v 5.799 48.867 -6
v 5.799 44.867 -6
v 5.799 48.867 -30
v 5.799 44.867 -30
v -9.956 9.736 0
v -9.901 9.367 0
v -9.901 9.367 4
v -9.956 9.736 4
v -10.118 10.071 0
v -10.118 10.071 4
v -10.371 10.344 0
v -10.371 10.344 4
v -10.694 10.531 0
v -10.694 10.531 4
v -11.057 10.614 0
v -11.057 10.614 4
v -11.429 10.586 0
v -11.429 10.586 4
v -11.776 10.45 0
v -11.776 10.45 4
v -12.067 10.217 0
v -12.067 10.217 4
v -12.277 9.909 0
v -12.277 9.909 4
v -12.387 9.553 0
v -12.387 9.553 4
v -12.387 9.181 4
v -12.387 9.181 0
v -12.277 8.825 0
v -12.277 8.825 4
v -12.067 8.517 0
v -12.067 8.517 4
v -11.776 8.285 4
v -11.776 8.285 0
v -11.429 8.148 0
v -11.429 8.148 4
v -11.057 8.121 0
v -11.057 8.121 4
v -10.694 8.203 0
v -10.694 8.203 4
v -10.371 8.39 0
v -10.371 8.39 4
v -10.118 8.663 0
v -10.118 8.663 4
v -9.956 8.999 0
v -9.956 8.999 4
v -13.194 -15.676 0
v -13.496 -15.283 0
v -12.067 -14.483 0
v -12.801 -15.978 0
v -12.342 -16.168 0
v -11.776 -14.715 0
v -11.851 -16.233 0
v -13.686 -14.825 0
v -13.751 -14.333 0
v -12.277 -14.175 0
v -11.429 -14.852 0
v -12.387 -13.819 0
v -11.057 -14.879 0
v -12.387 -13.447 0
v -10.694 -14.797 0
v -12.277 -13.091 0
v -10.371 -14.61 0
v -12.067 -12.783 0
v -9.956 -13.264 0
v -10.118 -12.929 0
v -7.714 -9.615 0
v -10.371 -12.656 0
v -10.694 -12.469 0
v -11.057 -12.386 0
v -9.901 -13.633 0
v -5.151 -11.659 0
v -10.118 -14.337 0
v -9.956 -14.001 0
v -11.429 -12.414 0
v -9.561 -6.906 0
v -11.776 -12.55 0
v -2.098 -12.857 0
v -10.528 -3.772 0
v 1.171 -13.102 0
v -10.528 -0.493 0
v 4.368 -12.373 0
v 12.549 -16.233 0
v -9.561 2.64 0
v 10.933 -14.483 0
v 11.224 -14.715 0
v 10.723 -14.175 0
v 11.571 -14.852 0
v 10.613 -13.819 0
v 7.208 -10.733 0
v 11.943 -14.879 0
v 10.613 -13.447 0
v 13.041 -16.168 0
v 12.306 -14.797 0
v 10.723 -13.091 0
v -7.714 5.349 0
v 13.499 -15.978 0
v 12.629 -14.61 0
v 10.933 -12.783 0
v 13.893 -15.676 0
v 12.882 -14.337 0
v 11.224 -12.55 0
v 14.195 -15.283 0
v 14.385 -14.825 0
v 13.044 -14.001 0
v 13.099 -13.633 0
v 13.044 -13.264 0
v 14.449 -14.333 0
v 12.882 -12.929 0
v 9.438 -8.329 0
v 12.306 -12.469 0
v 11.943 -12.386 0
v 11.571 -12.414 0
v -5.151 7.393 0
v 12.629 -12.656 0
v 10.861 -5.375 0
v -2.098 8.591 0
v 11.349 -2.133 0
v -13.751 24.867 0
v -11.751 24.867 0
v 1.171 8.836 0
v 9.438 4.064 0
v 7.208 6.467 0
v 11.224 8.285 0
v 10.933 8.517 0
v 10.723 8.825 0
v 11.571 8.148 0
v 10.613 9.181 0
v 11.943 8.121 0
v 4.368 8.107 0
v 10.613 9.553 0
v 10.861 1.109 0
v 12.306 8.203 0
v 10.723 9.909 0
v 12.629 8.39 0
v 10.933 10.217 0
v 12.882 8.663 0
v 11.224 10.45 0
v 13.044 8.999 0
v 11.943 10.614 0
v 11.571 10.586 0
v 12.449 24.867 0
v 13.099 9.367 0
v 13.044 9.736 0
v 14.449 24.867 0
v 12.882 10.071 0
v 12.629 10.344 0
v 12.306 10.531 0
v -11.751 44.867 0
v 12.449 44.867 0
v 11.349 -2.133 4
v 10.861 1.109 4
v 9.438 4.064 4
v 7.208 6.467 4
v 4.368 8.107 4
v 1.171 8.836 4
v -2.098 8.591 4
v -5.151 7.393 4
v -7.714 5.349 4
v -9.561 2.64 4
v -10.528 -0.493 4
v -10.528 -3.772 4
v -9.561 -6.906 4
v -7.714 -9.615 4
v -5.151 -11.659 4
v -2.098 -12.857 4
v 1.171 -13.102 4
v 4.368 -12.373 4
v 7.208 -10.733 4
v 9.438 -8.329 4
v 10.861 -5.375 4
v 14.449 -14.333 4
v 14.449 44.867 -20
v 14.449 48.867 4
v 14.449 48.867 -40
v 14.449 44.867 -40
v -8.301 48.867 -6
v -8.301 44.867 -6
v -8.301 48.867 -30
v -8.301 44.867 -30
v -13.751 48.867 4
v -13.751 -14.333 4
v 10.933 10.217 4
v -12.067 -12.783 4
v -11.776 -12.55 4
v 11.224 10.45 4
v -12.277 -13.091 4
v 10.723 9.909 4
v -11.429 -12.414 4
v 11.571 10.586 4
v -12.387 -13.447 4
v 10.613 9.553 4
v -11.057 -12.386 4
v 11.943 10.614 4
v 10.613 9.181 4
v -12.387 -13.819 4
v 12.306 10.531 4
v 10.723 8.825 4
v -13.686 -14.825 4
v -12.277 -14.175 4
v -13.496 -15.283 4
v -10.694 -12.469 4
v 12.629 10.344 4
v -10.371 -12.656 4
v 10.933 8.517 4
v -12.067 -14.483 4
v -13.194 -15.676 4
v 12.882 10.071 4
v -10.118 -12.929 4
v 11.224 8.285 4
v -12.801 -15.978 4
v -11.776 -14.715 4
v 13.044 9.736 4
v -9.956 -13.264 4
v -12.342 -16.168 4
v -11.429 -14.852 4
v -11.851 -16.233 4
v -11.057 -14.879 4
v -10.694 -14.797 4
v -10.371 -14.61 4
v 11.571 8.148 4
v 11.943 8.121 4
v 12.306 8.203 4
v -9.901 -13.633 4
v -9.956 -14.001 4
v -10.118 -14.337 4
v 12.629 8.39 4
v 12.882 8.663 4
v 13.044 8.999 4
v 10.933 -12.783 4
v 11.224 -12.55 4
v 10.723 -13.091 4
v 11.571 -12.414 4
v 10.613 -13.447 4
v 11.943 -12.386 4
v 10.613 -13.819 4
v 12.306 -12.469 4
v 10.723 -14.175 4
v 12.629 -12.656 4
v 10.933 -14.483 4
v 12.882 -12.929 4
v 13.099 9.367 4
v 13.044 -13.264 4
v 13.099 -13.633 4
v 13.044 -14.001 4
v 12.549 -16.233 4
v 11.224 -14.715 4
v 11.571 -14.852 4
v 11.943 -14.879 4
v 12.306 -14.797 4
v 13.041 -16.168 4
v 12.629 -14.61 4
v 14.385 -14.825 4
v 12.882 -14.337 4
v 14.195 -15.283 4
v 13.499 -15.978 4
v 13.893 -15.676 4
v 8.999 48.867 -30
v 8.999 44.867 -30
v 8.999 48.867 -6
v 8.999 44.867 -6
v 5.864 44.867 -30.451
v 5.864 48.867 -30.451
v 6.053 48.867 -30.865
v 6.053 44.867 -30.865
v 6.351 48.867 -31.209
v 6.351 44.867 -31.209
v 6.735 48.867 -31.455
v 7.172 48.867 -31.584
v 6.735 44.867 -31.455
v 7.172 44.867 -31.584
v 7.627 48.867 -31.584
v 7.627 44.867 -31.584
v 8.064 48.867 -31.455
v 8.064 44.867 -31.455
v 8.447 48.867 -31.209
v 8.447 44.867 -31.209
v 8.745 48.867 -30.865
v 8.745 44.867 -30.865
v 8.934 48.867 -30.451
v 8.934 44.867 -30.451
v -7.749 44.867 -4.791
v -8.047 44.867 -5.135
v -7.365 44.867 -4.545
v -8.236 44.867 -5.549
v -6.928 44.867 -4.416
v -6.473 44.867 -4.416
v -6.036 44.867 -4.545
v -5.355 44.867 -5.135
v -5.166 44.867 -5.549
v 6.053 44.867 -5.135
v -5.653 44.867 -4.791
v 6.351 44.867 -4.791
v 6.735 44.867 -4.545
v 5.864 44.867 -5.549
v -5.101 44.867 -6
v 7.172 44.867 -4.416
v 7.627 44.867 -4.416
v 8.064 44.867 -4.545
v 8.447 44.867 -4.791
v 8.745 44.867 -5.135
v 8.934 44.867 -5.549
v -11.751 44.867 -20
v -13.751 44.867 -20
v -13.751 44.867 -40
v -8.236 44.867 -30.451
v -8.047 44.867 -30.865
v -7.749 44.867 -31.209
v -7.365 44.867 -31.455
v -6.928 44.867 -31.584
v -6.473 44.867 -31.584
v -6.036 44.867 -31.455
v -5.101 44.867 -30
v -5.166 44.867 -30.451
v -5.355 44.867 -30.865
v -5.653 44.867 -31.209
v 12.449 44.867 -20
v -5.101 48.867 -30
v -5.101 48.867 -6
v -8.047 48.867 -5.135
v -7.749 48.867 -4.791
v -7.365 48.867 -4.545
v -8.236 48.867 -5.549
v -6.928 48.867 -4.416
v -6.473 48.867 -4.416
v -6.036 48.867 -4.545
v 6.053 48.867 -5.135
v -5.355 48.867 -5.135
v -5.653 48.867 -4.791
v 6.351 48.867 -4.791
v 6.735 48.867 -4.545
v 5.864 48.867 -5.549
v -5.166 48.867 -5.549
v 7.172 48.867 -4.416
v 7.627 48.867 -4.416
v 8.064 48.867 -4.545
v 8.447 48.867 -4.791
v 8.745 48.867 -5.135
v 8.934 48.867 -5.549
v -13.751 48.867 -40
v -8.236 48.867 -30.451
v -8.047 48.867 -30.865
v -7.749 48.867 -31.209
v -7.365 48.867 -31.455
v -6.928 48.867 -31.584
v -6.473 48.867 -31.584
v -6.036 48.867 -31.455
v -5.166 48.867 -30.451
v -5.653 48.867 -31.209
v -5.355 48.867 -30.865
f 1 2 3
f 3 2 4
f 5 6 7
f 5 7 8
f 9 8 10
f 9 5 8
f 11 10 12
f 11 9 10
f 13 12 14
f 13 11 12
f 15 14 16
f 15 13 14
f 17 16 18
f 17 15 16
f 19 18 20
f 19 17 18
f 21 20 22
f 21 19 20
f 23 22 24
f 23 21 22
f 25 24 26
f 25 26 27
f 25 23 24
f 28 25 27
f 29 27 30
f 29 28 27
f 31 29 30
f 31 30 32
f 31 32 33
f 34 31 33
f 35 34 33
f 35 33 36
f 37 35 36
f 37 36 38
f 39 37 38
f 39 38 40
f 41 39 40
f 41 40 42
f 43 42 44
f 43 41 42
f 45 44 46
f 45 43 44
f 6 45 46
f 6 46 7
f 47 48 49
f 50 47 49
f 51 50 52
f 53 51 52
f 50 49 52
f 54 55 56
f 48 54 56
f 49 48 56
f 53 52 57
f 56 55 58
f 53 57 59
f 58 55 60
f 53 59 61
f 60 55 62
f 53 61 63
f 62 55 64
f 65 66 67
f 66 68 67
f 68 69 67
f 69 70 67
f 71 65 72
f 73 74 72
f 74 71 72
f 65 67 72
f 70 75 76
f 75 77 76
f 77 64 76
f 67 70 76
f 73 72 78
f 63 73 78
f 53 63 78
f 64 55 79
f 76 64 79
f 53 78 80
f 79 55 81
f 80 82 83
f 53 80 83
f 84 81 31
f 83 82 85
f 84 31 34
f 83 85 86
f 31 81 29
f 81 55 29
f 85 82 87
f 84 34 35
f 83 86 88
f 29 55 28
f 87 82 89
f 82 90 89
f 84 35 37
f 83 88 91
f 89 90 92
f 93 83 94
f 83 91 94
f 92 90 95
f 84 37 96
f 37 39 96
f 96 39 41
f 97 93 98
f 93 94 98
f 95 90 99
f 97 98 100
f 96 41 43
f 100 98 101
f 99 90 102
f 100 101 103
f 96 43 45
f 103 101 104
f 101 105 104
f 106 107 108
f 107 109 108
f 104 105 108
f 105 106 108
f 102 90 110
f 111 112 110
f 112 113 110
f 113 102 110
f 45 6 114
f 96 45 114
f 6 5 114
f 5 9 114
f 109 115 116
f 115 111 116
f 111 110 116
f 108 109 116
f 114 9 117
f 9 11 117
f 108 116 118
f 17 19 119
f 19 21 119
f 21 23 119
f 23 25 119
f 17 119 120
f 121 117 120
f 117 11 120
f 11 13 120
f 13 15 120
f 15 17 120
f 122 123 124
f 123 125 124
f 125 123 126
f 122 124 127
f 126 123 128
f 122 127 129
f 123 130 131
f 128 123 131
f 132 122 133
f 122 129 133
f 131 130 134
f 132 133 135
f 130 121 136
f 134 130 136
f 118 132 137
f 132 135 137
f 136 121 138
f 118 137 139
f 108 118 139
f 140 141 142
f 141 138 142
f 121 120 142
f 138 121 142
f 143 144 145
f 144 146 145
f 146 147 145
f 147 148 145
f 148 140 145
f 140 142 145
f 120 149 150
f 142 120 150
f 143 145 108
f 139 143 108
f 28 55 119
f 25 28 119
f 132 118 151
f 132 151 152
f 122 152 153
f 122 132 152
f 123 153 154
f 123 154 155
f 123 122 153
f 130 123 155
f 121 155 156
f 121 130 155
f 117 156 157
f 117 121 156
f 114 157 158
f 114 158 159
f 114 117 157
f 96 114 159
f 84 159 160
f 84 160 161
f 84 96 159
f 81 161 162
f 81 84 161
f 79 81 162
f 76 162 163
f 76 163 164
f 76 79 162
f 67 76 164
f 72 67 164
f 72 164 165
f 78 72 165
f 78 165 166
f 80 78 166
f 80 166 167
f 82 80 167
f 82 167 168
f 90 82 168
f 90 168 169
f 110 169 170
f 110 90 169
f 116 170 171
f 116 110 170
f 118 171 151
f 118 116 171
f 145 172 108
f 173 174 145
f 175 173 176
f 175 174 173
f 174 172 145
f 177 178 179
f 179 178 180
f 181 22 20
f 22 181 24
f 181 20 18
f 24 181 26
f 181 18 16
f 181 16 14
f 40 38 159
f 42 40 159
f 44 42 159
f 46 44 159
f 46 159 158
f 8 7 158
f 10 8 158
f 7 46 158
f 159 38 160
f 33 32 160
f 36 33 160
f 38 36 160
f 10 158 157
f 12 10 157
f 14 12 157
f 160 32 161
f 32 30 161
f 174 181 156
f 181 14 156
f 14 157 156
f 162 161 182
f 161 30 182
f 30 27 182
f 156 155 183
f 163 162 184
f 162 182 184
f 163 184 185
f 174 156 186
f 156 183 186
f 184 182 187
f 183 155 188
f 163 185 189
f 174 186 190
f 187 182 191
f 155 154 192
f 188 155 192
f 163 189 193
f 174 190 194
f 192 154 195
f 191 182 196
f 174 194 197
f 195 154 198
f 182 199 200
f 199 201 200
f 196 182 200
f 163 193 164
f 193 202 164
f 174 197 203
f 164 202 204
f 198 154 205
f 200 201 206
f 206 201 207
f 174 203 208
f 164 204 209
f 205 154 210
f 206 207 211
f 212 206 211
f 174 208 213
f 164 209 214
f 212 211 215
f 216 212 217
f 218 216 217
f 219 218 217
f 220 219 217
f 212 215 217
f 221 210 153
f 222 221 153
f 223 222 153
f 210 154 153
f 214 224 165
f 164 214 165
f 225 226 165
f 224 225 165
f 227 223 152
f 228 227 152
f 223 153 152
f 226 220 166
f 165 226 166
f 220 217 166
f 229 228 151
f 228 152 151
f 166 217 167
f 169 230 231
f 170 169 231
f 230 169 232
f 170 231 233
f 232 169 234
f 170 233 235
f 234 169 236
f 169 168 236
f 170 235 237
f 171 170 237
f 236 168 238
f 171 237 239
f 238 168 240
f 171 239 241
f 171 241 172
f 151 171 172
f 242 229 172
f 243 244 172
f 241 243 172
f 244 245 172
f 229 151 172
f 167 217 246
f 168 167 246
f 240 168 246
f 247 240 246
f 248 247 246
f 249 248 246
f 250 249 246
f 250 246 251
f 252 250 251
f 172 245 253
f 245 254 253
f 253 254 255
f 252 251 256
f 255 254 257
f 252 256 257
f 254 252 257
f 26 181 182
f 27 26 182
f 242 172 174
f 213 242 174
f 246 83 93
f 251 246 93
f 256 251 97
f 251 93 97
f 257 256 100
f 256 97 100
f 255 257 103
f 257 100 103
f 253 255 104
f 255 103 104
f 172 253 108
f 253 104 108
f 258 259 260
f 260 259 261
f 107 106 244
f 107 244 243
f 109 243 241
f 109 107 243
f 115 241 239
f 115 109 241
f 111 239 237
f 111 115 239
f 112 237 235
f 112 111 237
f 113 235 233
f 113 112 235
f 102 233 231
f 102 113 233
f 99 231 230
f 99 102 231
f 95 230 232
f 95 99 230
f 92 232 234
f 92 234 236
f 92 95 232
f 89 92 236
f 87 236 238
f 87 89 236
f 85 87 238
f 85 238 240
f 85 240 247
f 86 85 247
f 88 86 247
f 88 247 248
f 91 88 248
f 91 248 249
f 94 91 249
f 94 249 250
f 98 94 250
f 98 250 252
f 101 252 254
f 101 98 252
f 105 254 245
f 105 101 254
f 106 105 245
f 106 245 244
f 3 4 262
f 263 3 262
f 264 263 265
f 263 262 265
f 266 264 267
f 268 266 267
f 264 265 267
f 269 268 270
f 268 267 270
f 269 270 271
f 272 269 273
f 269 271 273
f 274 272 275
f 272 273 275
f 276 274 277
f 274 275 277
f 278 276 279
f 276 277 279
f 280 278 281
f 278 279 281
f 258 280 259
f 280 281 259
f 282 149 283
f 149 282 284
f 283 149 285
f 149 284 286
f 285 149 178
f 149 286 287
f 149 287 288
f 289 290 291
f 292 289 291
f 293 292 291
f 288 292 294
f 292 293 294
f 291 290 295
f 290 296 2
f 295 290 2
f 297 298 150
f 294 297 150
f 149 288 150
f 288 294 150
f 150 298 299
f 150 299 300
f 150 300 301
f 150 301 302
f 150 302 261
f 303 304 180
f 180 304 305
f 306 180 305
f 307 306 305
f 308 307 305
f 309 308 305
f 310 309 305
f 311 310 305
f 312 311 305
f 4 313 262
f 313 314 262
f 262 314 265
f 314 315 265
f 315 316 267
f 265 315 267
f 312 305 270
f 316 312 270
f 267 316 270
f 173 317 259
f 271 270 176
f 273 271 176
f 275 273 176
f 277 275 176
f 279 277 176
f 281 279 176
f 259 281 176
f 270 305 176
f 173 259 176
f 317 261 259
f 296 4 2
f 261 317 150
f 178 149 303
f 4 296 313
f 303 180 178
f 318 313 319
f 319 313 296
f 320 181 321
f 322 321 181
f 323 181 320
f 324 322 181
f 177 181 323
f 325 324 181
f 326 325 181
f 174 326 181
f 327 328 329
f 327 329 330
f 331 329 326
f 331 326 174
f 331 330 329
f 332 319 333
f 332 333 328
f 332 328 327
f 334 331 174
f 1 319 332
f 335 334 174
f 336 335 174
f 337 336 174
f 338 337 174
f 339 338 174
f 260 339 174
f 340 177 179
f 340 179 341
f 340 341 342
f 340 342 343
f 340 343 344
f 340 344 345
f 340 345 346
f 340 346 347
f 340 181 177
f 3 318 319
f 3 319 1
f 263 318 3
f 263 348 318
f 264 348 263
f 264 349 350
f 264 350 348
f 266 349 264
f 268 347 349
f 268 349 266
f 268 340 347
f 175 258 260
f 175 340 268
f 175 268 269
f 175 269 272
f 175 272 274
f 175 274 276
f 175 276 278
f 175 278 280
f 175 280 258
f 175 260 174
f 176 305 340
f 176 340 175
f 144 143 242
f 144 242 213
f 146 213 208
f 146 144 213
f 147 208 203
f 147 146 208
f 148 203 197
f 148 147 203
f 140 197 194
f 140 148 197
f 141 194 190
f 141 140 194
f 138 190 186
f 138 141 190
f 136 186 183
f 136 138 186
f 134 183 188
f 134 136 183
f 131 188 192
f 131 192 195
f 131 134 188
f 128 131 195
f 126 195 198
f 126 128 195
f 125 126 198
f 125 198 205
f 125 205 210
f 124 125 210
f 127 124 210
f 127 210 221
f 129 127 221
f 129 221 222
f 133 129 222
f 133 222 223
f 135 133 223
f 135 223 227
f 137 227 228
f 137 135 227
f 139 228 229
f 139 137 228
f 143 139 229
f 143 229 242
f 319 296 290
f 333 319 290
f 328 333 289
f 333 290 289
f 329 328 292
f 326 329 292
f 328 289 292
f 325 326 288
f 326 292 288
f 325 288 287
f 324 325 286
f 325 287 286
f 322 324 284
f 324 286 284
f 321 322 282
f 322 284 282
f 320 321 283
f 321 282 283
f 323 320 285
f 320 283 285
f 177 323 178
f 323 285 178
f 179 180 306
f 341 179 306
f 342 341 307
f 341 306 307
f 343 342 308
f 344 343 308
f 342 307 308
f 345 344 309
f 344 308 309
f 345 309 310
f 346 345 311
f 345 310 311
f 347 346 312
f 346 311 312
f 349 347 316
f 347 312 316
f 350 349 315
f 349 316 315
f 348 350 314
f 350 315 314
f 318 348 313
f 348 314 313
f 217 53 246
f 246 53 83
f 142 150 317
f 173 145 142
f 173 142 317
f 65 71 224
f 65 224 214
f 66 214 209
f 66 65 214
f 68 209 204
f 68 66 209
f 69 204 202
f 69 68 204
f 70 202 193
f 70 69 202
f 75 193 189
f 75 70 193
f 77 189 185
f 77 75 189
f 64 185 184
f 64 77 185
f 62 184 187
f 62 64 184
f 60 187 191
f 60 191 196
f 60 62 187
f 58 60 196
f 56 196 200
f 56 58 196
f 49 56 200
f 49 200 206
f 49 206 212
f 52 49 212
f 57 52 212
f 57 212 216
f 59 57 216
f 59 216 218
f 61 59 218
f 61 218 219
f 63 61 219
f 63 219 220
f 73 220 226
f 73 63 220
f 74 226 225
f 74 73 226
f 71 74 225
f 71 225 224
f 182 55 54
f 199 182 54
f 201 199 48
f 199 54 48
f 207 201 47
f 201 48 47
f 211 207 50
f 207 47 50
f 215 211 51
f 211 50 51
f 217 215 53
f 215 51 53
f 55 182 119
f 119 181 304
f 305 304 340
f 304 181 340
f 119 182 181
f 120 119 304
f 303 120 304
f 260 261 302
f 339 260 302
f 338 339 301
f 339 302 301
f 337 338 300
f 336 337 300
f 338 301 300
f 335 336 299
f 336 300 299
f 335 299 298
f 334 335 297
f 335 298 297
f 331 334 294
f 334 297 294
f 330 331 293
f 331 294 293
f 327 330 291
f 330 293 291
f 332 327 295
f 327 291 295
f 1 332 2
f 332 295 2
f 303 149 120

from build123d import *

# Parameters (mm, degrees)
SKETCH_1_R      = 1.25
SKETCH_1_R_2    = 11
EXTRUDE_1_DEPTH = 4
SKETCH_2_W      = 28.2
SKETCH_2_H      = 4
SKETCH_2_H_2    = 40
EXTRUDE_2_DEPTH = 4
EXTRUDE_3_DEPTH = 2


with BuildPart() as part:
    # 草图1 → 凸台-拉伸1 (new body)
    with BuildSketch(Plane.XY):
        with BuildLine():
            Line((14.449257035, -14.332751245), (14.449257035, 44.867089431))
            Line((14.449257035, 44.867089431), (-13.750742965, 44.867089431))
            Line((-13.750742965, 44.867089431), (-13.750742965, -14.332751245))
            ThreePointArc((-13.750742965, -14.332751245), (-13.194199184, -15.676366788), (-11.850583641, -16.232910569))
            Line((-11.850583641, -16.232910569), (0.349257035, -16.232910569))
            Line((0.349257035, -16.232910569), (12.549097711, -16.232910569))
            ThreePointArc((12.549097711, -16.232910569), (13.892713254, -15.676366788), (14.449257035, -14.332751245))
        make_face()
        with Locations((-11.150742965, 9.367089431)):
            Circle(SKETCH_1_R, mode=Mode.SUBTRACT)
        with Locations((11.849257035, 9.367089431)):
            Circle(SKETCH_1_R, mode=Mode.SUBTRACT)
        with Locations((-11.150742965, -13.632910569)):
            Circle(SKETCH_1_R, mode=Mode.SUBTRACT)
        with Locations((11.849257035, -13.632910569)):
            Circle(SKETCH_1_R, mode=Mode.SUBTRACT)
        with Locations((0.349257035, -2.132910569)):
            Circle(SKETCH_1_R_2, mode=Mode.SUBTRACT)
    extrude(amount=EXTRUDE_1_DEPTH)

    # 草图2 → 凸台-拉伸2 (add)
    with BuildSketch(Plane(origin=(0, 44.867089431, 0), x_dir=(1, 0, 0), z_dir=(0, 1, 0))):
        with Locations((0.349257035, -2)):
            Rectangle(SKETCH_2_W, SKETCH_2_H)
        with Locations((0.349257035, 20)):
            Rectangle(SKETCH_2_W, SKETCH_2_H_2)
        with BuildLine():
            ThreePointArc((-5.100742965, 6), (-6.700742965, 4.4), (-8.300742965, 6))
            Line((-8.300742965, 6), (-8.300742965, 30))
            ThreePointArc((-8.300742965, 30), (-6.700742965, 31.6), (-5.100742965, 30))
            Line((-5.100742965, 30), (-5.100742965, 6))
        make_face(mode=Mode.SUBTRACT)
        with BuildLine():
            ThreePointArc((8.999257035, 6), (7.399257035, 4.4), (5.799257035, 6))
            Line((5.799257035, 6), (5.799257035, 30))
            ThreePointArc((5.799257035, 30), (7.399257035, 31.6), (8.999257035, 30))
            Line((8.999257035, 30), (8.999257035, 6))
        make_face(mode=Mode.SUBTRACT)
    extrude(amount=EXTRUDE_2_DEPTH)

    # 草图3 → 凸台-拉伸3 (add)
    with BuildSketch(Plane(origin=(14.449257035, 0, 0), x_dir=(0, 0, -1), z_dir=(1, 0, 0))):
        Polygon((20, 44.867089431), (0, 44.867089431), (0, 24.867089431), align=None)
    extrude_3 = extrude(amount=-EXTRUDE_3_DEPTH)

    # 镜向2: 凸台-拉伸3 across plane
    add(extrude_3.mirror(Plane(origin=(0.349257035, 0, 0), x_dir=(0, 0, 1), z_dir=(1, 0, 0))))


solid = part.part
